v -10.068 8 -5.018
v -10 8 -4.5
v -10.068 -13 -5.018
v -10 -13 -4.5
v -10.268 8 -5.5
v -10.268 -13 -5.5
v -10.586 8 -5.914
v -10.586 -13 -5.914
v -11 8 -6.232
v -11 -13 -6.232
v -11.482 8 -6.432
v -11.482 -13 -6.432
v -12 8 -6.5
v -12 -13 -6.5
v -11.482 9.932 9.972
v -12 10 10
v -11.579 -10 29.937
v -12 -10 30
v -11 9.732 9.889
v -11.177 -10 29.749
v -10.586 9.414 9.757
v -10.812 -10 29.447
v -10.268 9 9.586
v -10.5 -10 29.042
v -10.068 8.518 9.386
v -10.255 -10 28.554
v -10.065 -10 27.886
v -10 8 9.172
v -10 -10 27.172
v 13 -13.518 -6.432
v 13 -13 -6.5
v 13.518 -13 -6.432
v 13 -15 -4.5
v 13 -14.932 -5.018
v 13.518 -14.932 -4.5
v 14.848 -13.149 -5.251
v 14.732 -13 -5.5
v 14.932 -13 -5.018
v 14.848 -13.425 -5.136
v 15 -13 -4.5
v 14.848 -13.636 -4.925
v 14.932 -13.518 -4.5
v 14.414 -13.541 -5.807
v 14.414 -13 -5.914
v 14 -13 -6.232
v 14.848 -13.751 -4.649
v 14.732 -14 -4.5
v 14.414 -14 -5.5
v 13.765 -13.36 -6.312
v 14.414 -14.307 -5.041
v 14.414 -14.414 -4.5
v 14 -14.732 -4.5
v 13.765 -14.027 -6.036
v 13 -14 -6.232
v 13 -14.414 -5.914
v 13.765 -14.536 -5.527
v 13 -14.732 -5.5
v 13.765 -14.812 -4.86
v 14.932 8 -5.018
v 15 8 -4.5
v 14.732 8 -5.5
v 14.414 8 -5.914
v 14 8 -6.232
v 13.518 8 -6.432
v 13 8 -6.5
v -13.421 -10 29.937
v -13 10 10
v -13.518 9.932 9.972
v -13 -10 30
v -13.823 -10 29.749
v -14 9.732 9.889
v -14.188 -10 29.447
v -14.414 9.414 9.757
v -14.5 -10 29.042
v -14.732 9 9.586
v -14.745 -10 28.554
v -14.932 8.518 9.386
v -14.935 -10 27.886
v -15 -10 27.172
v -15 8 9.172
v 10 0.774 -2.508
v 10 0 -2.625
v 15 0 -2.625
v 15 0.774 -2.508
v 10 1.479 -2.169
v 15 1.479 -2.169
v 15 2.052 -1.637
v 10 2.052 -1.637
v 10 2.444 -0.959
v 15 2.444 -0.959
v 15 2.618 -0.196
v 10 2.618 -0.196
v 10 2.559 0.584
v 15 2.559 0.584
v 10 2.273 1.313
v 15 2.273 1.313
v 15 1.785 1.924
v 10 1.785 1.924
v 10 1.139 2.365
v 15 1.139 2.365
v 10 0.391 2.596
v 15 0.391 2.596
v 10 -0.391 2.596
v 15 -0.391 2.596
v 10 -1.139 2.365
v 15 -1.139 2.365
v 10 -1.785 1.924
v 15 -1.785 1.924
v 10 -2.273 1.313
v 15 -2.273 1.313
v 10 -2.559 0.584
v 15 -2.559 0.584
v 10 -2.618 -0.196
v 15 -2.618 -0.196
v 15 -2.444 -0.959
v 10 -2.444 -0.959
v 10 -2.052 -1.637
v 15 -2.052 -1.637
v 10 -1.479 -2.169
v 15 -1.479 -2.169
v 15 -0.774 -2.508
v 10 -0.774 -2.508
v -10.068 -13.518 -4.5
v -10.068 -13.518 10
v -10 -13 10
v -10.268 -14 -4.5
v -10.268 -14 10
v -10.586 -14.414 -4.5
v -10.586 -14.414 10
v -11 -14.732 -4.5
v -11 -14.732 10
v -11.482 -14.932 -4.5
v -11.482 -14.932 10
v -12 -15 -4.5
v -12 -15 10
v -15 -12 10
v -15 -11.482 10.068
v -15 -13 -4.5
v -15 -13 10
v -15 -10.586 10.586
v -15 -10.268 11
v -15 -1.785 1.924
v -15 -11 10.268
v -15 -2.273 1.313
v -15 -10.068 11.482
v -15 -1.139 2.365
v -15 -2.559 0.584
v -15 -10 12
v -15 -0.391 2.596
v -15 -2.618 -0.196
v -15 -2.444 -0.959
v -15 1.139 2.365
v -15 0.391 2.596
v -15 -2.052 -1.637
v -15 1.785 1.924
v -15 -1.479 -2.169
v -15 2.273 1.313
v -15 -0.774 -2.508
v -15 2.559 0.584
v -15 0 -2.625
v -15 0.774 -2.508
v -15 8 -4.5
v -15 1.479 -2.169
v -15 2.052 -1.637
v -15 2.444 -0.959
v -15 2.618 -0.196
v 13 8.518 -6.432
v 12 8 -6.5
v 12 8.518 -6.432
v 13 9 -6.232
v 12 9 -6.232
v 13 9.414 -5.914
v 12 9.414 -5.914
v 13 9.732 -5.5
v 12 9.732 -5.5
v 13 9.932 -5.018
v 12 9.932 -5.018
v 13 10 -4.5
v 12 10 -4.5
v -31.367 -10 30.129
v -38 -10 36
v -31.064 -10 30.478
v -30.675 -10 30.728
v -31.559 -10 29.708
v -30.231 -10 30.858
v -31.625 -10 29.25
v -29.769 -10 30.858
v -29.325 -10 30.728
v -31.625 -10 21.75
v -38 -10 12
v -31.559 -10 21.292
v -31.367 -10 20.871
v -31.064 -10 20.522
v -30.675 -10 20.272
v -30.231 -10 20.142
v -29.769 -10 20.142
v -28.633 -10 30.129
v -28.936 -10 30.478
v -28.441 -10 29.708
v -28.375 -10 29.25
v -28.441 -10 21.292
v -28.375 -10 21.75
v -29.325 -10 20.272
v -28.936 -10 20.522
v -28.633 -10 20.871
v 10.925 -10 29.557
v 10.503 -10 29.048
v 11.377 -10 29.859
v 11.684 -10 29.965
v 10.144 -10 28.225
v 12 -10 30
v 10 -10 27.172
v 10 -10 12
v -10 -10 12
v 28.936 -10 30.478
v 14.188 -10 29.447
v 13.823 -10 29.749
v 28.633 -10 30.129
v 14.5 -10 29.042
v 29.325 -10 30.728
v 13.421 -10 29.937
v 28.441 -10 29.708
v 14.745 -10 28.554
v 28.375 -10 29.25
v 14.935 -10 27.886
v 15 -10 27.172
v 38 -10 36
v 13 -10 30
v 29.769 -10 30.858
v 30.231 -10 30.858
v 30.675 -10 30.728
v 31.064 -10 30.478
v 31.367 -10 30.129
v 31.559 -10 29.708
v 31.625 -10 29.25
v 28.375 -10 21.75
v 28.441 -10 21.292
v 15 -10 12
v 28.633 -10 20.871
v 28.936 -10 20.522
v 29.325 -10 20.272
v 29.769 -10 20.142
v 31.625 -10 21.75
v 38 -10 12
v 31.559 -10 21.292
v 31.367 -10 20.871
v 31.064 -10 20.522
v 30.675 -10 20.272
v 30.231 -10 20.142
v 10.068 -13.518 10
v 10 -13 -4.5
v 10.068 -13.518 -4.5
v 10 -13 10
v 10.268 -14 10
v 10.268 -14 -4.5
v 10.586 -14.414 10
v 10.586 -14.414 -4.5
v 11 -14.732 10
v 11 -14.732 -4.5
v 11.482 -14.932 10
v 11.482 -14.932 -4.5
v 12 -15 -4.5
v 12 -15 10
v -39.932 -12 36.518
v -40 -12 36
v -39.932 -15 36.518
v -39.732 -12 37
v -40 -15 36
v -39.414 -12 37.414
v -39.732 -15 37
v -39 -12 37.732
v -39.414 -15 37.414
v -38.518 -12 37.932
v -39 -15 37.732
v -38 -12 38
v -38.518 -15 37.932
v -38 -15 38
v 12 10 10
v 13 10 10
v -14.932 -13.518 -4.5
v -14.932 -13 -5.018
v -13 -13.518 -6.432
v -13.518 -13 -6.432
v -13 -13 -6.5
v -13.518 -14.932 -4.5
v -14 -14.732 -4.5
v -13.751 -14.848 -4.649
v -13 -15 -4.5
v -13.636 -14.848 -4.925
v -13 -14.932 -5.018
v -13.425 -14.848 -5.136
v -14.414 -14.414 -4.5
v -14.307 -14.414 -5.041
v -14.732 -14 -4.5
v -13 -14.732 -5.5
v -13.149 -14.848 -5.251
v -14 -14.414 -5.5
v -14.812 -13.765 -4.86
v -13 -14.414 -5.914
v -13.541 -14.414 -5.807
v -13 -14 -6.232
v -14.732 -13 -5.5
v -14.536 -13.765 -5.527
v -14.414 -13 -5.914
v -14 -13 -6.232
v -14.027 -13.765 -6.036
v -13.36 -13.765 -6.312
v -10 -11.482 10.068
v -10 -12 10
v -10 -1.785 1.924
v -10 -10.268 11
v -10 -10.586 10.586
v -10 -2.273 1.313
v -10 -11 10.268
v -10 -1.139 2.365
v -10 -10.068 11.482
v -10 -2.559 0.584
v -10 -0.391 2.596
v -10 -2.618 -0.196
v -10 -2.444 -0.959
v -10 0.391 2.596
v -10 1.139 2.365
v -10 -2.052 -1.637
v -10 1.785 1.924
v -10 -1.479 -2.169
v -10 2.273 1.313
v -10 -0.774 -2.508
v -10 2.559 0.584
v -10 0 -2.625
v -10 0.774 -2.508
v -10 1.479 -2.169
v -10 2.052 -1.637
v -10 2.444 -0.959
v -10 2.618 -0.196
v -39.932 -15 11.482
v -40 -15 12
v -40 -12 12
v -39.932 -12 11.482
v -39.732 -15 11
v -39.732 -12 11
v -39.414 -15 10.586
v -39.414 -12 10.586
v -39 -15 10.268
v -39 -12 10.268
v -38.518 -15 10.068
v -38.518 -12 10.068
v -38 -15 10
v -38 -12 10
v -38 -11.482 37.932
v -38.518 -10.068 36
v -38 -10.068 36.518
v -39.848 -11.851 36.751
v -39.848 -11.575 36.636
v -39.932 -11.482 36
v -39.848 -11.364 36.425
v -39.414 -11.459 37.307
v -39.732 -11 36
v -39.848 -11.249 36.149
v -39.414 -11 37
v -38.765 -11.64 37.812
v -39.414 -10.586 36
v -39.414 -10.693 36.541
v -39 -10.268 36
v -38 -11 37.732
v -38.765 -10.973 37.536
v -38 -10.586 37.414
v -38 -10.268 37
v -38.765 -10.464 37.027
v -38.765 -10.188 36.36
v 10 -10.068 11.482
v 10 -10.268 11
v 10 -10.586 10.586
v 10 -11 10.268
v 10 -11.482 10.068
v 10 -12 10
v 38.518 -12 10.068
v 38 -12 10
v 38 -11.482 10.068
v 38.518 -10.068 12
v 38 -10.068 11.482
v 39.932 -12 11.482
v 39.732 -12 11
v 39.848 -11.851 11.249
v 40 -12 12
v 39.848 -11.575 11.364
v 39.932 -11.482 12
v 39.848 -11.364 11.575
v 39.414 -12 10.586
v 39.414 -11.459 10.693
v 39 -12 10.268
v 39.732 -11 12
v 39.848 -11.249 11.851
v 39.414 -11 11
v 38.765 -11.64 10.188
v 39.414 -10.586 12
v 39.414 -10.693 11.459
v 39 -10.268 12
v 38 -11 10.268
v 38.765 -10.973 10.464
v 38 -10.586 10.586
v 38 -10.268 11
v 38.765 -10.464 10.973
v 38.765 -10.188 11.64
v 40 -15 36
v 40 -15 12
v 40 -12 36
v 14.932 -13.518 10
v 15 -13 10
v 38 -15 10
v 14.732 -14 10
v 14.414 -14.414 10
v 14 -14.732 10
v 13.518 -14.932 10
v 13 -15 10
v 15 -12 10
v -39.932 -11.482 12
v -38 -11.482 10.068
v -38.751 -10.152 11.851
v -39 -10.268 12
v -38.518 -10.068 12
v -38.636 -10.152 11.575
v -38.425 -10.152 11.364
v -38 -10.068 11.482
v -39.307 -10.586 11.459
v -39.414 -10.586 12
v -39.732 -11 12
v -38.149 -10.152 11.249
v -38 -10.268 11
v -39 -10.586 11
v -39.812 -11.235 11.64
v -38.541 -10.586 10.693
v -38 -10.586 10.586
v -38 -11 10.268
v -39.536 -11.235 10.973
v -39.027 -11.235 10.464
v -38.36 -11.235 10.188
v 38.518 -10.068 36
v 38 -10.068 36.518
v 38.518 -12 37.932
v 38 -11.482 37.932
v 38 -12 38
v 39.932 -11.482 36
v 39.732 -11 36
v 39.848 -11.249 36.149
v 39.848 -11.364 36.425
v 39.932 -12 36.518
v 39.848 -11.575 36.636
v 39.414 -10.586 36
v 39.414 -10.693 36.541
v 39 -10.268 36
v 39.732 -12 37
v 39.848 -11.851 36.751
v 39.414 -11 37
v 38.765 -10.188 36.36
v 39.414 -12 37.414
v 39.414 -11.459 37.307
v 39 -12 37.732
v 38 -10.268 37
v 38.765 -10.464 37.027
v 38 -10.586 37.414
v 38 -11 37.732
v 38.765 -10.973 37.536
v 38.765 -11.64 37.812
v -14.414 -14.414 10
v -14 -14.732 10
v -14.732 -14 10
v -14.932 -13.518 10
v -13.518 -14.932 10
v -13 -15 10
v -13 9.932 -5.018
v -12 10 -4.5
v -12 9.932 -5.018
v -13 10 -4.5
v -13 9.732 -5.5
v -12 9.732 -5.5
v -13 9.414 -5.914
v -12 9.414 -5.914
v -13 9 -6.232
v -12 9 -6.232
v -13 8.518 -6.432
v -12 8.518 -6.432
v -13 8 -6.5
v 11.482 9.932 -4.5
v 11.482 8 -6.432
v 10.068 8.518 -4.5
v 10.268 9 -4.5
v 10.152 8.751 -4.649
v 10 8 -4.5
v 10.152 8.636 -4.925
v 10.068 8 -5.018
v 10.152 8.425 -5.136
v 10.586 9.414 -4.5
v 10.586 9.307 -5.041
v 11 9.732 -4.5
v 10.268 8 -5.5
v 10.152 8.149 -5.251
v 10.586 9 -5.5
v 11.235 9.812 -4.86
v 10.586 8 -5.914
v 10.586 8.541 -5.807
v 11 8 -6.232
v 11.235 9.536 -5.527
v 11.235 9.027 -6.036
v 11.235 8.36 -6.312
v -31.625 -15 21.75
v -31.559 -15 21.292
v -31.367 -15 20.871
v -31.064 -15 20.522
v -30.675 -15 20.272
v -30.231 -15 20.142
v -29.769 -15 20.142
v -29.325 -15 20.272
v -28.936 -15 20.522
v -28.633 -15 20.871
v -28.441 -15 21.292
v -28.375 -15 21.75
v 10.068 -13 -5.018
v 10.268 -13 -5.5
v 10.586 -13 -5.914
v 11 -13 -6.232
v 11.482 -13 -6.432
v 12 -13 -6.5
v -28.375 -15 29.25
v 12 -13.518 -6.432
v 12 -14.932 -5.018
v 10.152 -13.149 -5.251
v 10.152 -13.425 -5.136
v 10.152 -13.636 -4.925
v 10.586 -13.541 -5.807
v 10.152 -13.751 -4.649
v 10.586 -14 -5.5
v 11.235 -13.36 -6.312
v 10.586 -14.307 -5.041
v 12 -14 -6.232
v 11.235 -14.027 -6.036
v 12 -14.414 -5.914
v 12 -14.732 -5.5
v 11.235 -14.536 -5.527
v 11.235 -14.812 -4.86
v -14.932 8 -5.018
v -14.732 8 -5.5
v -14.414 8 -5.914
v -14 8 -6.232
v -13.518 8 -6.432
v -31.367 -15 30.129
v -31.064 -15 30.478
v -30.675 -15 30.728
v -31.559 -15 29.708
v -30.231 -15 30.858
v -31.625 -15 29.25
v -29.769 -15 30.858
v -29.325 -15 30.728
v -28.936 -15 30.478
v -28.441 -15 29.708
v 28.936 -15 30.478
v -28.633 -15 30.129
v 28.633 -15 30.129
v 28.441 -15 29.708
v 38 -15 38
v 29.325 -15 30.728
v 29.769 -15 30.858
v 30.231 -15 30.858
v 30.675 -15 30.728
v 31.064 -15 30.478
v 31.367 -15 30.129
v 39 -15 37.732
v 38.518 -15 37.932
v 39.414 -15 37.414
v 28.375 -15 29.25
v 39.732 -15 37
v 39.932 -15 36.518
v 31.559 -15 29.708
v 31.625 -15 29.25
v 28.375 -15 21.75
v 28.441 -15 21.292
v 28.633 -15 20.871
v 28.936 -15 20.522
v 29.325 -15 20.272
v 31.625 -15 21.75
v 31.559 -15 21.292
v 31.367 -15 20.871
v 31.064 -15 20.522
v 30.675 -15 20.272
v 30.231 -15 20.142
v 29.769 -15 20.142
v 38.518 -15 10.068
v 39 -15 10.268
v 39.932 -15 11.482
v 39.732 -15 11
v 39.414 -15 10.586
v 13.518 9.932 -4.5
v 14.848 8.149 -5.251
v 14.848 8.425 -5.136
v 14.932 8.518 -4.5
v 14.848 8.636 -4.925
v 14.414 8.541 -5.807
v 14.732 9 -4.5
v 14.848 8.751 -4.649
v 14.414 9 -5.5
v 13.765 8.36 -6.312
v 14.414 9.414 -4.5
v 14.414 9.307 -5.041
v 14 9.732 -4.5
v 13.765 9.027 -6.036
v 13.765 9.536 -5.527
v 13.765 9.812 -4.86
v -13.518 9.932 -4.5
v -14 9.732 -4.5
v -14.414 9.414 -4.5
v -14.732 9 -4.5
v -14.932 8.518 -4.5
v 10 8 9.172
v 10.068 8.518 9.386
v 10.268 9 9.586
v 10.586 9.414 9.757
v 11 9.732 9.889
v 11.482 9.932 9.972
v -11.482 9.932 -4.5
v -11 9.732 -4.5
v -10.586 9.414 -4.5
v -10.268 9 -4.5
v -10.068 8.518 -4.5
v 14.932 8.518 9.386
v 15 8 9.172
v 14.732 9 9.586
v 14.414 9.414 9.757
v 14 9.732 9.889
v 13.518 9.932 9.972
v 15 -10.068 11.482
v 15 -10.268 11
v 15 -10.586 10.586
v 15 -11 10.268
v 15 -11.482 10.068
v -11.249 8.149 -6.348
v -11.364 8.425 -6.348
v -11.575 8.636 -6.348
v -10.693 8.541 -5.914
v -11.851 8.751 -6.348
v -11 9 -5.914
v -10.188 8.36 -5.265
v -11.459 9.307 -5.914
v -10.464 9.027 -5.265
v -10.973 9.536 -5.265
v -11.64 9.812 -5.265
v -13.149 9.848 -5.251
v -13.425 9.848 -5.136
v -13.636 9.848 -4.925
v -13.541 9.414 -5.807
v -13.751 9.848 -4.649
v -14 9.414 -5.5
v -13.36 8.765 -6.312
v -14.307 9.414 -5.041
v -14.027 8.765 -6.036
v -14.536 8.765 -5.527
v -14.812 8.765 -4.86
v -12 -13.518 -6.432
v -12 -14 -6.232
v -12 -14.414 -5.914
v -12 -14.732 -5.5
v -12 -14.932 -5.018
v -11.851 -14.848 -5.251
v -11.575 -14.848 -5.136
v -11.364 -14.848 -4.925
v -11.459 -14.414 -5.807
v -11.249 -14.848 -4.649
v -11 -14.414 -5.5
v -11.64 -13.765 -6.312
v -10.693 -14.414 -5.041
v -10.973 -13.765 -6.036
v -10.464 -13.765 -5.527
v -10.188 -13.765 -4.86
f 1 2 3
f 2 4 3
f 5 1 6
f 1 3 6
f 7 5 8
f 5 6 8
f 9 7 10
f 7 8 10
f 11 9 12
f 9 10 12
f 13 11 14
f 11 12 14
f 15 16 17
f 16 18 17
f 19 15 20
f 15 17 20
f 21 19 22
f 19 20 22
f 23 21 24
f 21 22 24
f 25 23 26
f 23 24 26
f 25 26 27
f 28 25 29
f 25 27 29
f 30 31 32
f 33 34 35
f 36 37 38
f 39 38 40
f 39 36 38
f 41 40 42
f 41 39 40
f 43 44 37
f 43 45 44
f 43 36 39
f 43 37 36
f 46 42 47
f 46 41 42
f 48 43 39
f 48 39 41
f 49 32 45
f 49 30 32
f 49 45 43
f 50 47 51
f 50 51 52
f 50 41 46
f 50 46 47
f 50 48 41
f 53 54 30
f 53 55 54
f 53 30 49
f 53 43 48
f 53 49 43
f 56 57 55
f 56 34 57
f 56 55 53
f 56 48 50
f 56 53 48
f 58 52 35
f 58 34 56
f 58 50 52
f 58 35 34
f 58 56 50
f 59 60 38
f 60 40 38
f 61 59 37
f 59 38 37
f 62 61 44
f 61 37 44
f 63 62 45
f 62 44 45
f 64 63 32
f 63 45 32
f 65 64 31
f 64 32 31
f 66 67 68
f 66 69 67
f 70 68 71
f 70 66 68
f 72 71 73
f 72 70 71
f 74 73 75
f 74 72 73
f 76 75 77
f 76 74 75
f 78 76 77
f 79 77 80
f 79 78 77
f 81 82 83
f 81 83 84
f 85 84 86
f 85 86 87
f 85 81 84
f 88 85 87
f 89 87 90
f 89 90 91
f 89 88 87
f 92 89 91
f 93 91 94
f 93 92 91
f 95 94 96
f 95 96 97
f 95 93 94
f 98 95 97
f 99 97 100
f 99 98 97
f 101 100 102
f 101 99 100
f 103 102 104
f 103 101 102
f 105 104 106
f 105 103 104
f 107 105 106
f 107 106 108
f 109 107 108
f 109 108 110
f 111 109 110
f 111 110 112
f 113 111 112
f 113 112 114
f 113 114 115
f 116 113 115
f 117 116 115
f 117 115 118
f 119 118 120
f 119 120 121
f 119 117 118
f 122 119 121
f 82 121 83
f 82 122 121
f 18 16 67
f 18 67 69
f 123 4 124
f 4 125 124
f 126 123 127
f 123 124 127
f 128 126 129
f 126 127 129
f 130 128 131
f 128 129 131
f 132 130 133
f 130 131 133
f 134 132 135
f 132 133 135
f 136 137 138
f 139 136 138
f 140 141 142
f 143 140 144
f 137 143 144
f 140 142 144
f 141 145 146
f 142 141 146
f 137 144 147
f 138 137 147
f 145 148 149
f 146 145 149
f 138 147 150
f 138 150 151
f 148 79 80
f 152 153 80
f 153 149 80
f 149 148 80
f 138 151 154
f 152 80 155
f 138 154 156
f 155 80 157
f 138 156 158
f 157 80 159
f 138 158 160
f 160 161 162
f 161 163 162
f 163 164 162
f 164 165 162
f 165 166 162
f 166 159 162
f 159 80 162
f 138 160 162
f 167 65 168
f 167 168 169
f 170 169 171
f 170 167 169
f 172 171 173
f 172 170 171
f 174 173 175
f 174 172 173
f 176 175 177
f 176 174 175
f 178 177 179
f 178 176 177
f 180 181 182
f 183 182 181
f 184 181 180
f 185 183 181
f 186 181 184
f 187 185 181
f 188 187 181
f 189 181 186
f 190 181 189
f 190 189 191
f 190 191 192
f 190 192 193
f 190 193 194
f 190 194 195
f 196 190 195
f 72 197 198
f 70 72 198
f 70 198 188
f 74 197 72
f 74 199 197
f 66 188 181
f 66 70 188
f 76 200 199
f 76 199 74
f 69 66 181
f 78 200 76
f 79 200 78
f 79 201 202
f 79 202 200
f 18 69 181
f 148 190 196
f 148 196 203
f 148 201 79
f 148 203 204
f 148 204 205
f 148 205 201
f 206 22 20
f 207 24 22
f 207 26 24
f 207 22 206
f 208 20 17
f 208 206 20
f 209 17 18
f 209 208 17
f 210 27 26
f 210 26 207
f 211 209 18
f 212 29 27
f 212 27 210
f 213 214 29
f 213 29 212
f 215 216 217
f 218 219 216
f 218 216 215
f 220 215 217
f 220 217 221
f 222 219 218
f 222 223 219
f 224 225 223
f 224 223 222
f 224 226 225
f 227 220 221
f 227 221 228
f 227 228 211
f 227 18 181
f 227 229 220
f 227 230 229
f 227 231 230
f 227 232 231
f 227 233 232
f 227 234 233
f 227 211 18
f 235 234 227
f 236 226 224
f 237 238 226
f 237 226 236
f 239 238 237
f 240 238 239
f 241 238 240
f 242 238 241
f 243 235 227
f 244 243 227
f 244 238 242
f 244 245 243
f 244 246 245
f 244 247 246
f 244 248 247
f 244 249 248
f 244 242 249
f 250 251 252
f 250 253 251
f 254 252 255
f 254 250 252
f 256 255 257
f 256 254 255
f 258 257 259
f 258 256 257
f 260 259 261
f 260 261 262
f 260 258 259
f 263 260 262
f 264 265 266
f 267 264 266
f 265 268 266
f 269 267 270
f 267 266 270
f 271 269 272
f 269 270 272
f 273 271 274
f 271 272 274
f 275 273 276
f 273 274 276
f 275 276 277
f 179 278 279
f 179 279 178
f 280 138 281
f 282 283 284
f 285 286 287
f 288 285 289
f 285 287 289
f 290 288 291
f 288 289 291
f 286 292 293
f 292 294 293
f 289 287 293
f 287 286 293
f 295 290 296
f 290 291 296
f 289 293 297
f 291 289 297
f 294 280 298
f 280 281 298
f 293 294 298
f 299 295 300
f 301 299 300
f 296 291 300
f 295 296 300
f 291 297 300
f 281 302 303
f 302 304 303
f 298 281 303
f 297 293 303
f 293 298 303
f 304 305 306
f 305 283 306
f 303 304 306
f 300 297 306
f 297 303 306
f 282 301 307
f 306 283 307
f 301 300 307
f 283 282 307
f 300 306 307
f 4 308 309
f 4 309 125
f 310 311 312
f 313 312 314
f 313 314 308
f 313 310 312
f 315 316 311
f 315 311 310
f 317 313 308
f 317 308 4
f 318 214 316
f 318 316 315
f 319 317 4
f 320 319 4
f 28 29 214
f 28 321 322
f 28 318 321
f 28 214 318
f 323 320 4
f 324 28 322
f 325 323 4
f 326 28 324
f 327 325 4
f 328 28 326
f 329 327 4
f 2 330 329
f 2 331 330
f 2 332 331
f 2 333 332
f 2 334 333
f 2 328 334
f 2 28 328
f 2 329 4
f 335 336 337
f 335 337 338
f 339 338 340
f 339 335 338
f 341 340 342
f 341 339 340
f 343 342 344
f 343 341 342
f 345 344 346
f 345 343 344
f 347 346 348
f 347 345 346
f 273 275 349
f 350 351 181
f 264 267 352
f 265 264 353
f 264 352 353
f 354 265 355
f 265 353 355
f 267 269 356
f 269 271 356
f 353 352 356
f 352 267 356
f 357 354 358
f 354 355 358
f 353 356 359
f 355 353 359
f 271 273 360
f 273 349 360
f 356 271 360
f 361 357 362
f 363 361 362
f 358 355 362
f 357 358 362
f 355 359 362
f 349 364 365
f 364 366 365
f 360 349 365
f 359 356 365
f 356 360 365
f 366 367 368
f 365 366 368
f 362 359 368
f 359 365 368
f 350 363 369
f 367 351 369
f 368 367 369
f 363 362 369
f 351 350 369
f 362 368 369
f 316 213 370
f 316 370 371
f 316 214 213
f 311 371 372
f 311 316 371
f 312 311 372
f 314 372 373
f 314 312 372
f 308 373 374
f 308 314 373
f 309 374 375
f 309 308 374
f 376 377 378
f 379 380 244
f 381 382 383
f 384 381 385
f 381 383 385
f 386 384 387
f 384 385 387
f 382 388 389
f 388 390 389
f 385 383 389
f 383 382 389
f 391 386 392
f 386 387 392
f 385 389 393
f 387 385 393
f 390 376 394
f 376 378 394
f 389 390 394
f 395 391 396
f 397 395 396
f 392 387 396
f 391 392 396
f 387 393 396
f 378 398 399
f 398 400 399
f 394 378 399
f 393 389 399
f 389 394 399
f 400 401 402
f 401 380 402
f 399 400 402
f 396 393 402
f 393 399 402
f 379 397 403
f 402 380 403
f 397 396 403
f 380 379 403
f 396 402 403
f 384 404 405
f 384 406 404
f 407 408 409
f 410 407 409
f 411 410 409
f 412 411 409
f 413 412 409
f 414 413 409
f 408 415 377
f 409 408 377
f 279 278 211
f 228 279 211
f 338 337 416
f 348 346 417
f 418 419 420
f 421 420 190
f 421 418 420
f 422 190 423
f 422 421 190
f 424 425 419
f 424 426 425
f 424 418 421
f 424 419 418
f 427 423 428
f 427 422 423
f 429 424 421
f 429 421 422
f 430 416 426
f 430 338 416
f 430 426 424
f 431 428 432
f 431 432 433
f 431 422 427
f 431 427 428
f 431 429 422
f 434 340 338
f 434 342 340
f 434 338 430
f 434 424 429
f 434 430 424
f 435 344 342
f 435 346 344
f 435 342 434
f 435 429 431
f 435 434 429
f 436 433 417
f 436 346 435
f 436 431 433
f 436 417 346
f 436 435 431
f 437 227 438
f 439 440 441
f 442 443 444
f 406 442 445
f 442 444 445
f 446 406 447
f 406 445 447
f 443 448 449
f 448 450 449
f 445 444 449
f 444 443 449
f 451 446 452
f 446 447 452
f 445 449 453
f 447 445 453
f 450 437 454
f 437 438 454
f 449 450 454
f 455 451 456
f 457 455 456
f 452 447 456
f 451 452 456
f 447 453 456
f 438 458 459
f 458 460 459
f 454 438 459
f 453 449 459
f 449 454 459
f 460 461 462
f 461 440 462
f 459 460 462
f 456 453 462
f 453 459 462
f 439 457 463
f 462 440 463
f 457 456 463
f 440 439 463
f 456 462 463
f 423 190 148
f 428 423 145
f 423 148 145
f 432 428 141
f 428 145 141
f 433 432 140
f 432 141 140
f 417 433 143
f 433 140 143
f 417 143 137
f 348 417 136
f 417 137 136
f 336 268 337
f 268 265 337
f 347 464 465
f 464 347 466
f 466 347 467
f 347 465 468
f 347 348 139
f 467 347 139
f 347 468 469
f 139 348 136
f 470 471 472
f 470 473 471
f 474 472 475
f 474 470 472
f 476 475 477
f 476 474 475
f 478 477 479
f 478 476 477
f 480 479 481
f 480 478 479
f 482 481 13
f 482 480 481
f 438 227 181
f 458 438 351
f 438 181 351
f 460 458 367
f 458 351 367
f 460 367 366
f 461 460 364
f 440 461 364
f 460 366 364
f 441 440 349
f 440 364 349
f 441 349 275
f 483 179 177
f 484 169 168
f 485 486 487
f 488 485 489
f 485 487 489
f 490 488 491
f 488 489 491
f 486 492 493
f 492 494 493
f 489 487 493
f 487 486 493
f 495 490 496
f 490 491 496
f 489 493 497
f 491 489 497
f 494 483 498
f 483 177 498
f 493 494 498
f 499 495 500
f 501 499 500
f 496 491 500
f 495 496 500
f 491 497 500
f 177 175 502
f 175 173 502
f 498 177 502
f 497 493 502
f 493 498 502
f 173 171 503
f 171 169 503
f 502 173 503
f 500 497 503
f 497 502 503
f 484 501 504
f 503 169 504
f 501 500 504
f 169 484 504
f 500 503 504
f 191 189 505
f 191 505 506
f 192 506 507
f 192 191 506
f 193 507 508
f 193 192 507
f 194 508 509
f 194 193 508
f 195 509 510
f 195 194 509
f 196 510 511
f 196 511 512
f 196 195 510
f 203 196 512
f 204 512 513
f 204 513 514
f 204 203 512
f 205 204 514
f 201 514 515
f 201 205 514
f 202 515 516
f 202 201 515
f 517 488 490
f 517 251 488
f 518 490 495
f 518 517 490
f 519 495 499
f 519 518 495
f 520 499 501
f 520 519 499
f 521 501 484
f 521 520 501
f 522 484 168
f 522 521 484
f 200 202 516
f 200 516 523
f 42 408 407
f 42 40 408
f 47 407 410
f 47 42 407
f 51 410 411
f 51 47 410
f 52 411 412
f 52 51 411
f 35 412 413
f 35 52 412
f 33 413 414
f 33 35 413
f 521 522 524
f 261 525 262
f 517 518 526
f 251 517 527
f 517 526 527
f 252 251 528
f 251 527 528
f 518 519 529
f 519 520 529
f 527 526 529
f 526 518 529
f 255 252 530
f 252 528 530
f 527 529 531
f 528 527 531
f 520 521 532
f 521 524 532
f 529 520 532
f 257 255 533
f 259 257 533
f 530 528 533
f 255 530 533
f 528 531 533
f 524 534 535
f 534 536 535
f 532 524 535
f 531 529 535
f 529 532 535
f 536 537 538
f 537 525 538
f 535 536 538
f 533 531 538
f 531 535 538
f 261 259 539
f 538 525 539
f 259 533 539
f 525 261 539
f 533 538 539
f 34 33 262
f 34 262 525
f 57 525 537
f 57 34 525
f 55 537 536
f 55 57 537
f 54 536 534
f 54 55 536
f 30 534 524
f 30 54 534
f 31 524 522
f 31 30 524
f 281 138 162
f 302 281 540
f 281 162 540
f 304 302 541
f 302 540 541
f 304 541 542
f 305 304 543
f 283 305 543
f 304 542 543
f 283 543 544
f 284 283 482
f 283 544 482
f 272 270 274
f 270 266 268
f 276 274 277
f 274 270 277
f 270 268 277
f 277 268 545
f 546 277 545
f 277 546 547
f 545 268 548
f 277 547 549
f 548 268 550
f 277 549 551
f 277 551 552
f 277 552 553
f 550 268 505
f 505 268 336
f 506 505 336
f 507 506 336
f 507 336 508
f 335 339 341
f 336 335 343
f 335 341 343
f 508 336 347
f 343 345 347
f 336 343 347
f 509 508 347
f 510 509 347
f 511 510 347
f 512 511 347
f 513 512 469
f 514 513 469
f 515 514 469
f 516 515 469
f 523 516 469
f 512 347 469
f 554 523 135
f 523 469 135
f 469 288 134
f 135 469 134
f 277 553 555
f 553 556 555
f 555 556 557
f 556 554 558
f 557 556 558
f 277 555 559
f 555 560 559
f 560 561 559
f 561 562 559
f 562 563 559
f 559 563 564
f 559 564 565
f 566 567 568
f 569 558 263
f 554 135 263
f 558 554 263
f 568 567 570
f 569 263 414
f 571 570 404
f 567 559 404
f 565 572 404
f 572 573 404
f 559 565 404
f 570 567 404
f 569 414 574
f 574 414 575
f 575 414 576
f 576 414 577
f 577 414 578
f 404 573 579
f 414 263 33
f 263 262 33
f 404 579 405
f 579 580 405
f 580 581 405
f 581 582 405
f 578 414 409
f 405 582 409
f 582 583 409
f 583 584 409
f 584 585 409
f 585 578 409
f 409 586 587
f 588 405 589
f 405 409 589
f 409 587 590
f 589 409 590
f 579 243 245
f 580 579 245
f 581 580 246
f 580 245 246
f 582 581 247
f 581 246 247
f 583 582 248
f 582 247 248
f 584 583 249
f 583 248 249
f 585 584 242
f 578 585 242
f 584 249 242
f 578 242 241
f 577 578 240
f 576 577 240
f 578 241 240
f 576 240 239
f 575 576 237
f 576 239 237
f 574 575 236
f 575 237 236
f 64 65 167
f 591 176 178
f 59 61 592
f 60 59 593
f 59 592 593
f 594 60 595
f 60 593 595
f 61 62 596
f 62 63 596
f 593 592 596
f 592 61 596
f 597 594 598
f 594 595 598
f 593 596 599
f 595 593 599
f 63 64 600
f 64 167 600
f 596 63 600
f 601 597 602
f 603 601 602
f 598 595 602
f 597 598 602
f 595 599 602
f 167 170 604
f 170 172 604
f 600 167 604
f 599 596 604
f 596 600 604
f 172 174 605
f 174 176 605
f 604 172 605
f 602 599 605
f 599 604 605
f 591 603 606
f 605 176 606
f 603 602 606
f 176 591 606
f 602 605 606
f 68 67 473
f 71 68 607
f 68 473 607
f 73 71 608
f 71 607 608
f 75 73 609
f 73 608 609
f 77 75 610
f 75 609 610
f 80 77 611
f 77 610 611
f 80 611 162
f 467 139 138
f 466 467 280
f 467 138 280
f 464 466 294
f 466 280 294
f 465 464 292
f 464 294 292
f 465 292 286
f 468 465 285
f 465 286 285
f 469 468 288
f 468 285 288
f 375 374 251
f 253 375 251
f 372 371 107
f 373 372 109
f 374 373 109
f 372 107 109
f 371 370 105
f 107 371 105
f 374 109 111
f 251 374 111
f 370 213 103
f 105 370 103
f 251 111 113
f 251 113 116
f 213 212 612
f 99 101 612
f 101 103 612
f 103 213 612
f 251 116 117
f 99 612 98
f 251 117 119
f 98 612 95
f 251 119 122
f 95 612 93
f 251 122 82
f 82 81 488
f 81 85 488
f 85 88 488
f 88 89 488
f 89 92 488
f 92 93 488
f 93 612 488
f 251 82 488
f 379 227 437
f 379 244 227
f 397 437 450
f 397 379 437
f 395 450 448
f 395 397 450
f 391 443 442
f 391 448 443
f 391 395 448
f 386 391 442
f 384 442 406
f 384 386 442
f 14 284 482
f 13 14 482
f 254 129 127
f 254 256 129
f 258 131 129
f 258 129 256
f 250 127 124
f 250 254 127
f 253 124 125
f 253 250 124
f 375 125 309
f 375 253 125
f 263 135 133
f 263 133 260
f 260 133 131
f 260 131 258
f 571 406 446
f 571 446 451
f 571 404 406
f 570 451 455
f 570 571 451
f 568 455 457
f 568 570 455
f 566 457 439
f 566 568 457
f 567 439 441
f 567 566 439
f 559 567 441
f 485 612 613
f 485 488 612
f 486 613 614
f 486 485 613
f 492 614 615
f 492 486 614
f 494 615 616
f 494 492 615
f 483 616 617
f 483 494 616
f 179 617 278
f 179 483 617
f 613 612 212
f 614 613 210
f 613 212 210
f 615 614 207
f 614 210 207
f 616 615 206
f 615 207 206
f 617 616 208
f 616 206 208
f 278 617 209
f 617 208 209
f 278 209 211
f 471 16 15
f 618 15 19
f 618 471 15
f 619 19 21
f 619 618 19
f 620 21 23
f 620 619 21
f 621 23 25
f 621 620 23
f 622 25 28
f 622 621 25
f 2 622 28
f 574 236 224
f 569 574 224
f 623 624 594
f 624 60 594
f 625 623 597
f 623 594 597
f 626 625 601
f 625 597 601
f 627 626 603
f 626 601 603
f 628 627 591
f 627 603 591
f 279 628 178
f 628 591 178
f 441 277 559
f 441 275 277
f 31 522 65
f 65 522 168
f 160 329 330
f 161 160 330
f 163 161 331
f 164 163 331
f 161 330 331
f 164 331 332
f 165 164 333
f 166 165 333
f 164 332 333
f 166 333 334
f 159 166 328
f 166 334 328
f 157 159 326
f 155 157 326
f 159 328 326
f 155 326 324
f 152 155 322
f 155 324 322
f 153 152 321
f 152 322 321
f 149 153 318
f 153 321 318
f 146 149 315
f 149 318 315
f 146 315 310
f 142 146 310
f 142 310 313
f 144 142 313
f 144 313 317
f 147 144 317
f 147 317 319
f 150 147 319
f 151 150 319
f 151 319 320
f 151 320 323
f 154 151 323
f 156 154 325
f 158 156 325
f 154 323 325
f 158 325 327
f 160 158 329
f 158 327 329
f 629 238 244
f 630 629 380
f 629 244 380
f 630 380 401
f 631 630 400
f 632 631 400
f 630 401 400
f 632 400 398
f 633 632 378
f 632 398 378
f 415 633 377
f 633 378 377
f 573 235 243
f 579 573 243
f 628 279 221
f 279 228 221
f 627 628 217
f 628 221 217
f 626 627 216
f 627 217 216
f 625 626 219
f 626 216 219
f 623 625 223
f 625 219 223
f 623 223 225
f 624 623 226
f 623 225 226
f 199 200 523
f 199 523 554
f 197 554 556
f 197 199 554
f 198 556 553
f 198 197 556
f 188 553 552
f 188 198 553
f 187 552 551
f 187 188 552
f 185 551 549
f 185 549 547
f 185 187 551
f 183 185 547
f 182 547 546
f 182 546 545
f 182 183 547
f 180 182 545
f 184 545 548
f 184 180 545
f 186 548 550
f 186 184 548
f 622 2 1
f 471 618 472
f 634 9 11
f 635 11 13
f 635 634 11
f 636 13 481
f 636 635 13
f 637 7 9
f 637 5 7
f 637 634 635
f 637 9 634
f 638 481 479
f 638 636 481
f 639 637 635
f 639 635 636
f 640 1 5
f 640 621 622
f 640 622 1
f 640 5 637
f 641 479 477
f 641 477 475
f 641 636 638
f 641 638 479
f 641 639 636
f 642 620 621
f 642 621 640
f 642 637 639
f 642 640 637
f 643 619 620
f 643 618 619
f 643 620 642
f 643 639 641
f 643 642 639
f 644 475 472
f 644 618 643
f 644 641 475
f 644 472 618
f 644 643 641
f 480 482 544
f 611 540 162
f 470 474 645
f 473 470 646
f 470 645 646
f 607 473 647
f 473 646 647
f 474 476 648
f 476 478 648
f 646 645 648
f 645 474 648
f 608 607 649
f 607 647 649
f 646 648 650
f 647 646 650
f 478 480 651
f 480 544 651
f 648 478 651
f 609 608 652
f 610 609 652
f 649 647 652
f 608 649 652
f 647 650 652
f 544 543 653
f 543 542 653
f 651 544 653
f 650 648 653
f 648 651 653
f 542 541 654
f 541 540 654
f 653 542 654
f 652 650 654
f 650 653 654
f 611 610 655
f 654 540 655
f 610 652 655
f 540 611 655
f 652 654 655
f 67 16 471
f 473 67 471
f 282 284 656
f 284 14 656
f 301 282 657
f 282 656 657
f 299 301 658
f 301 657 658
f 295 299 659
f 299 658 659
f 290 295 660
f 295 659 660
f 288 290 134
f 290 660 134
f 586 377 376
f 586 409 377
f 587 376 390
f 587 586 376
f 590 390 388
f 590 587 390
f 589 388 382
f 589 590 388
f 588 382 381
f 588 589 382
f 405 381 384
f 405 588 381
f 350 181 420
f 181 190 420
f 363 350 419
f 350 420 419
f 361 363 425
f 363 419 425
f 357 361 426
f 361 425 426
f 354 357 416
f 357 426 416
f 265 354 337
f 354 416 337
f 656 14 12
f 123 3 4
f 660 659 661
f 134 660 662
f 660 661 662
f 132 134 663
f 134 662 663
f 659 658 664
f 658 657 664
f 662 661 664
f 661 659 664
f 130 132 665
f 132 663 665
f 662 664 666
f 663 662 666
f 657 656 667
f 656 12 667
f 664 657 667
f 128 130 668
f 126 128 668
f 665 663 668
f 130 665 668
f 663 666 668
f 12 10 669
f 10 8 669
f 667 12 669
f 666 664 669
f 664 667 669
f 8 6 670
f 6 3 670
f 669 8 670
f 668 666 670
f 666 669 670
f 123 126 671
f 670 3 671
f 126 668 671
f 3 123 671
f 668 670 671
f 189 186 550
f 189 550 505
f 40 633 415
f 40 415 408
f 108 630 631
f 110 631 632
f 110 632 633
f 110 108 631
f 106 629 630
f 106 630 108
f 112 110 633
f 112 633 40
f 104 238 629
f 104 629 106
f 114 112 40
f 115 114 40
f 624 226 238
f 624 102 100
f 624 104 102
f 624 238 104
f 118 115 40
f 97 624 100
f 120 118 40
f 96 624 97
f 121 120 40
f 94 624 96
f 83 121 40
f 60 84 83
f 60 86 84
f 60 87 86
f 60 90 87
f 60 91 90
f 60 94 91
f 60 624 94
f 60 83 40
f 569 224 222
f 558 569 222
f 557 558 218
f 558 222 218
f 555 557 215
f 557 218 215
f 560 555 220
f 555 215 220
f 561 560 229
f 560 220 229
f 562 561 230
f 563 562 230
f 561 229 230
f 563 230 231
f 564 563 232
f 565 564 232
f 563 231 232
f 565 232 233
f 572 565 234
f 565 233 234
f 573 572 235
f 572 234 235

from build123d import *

# Parameters (mm, degrees)
BOSS_EXTRUDE1_START            = 10
SKETCH1_W                      = 16.5
SKETCH1_H                      = 20
SKETCH1_R                      = 2.625
BOSS_EXTRUDE1_DEPTH            = 5
BOSS_EXTRUDE2_START            = -10
SKETCH1_3_W                    = 16.5
SKETCH1_3_H                    = 20
SKETCH1_3_R                    = 2.625
BOSS_EXTRUDE2_DEPTH            = 5
BOSS_EXTRUDE3_START            = -15
SKETCH1_4_W                    = 16.5
SKETCH1_4_H                    = 5
SKETCH1_4_W_2                  = 28
BOSS_EXTRUDE3_DEPTH            = 30
SKETCH2_W                      = 25
SKETCH2_H                      = 28
BOSS_EXTRUDE4_DEPTH            = 5
CUT_EXTRUDE1_REACH             = 59.175
SKETCH1_6_W                    = 16.5
SKETCH1_6_H                    = 5
CUT_EXTRUDE1_DIRECTION_2_REACH = 59.175
BOSS_EXTRUDE5_START            = 10
BOSS_EXTRUDE5_DEPTH            = 5
BOSS_EXTRUDE6_START            = -10
BOSS_EXTRUDE6_DEPTH            = 5
FILLET1_R                      = 2


with BuildPart() as part:
    # Sketch1 → Boss-Extrude1 (new body)
    with BuildSketch(Plane(origin=(0, 0, 0), x_dir=(0, 0, -1), z_dir=(1, 0, 0)).offset(BOSS_EXTRUDE1_START)):
        with Locations((-1.75, 0)):
            Rectangle(SKETCH1_W, SKETCH1_H)
        Circle(SKETCH1_R, mode=Mode.SUBTRACT)
    extrude(amount=BOSS_EXTRUDE1_DEPTH)



with BuildPart() as body_2:
    # Sketch1<3> → Boss-Extrude2 (new body)
    with BuildSketch(Plane(origin=(0, 0, 0), x_dir=(0, 0, -1), z_dir=(1, 0, 0)).offset(BOSS_EXTRUDE2_START)):
        with Locations((-1.75, 0)):
            Rectangle(SKETCH1_3_W, SKETCH1_3_H)
        Circle(SKETCH1_3_R, mode=Mode.SUBTRACT)
    extrude(amount=-BOSS_EXTRUDE2_DEPTH)


with BuildPart() as part_1:
    add(part.part)

    add(body_2.part)  # Boss-Extrude3 merges body 2
    # Sketch1<4> → Boss-Extrude3 (add)
    with BuildSketch(Plane(origin=(0, 0, 0), x_dir=(0, 0, -1), z_dir=(1, 0, 0)).offset(BOSS_EXTRUDE3_START)):
        with Locations((-1.75, -12.5)):
            Rectangle(SKETCH1_4_W, SKETCH1_4_H)
        with Locations((-24, -12.5)):
            Rectangle(SKETCH1_4_W_2, SKETCH1_4_H)
    extrude(amount=BOSS_EXTRUDE3_DEPTH)

    # Sketch2 → Boss-Extrude4 (add)
    with BuildSketch(Plane(origin=(0, -10, 0), x_dir=(1, 0, 0), z_dir=(0, 1, 0))):
        with Locations((-27.5, -24)):
            Rectangle(SKETCH2_W, SKETCH2_H)
        with BuildLine():
            Line((-31.625, -29.25), (-31.625, -21.75))
            ThreePointArc((-31.625, -21.75), (-30, -20.125), (-28.375, -21.75))
            Line((-28.375, -21.75), (-28.375, -29.25))
            ThreePointArc((-28.375, -29.25), (-30, -30.875), (-31.625, -29.25))
        make_face(mode=Mode.SUBTRACT)
        with Locations((27.5, -24)):
            Rectangle(SKETCH2_W, SKETCH2_H)
        with BuildLine():
            Line((31.625, -29.25), (31.625, -21.75))
            ThreePointArc((31.625, -21.75), (30, -20.125), (28.375, -21.75))
            Line((28.375, -21.75), (28.375, -29.25))
            ThreePointArc((28.375, -29.25), (30, -30.875), (31.625, -29.25))
        make_face(mode=Mode.SUBTRACT)
    extrude(amount=-BOSS_EXTRUDE4_DEPTH)

    # Cut-Extrude1: up to this face of the body (flat: up to its plane)
    cut_extrude1_end = Plane(part_1.part.faces().sort_by_distance((10, 0, -6.240722157))[0])
    # Sketch1<6> → Cut-Extrude1 (cut, up to the picked face)
    with BuildSketch(Plane(origin=(0, 0, 0), x_dir=(0, 0, -1), z_dir=(1, 0, 0)), mode=Mode.PRIVATE) as cut_extrude1_sk1:
        with Locations((-1.75, -12.5)):
            Rectangle(SKETCH1_6_W, SKETCH1_6_H)
    cut_extrude1_tool1 = split(extrude(cut_extrude1_sk1.sketch, amount=CUT_EXTRUDE1_REACH, mode=Mode.PRIVATE), bisect_by=cut_extrude1_end, keep=Keep.BOTH, mode=Mode.PRIVATE)
    add(cut_extrude1_tool1.solids().sort_by(Axis((0, -12.5, 1.75), (1, 0, 0)))[0], mode=Mode.SUBTRACT)

    # Cut-Extrude1 direction 2: up to this face of the body (flat: up to its plane)
    cut_extrude1_direction_2_end = Plane(part_1.part.faces().sort_by_distance((-10, 0, -6.240722157))[0])
    # Sketch1<6> → Cut-Extrude1 direction 2 (cut, up to the picked face)
    with BuildSketch(Plane(origin=(0, 0, 0), x_dir=(0, 0, -1), z_dir=(1, 0, 0)), mode=Mode.PRIVATE) as cut_extrude1_direction_2_sk1:
        with Locations((-1.75, -12.5)):
            Rectangle(SKETCH1_6_W, SKETCH1_6_H)
    cut_extrude1_direction_2_tool1 = split(extrude(cut_extrude1_direction_2_sk1.sketch, amount=-CUT_EXTRUDE1_DIRECTION_2_REACH, mode=Mode.PRIVATE), bisect_by=cut_extrude1_direction_2_end, keep=Keep.BOTH, mode=Mode.PRIVATE)
    add(cut_extrude1_direction_2_tool1.solids().sort_by(Axis((0, -12.5, 1.75), (-1, 0, 0)))[0], mode=Mode.SUBTRACT)

    # Sketch1<7> → Boss-Extrude5 (add)
    with BuildSketch(Plane(origin=(0, 0, 0), x_dir=(0, 0, -1), z_dir=(1, 0, 0)).offset(BOSS_EXTRUDE5_START)):
        Polygon((-30, -10), (-10, -10), (-10, 10), align=None)
    extrude(amount=BOSS_EXTRUDE5_DEPTH)

    # Sketch1<8> → Boss-Extrude6 (add)
    with BuildSketch(Plane(origin=(0, 0, 0), x_dir=(0, 0, -1), z_dir=(1, 0, 0)).offset(BOSS_EXTRUDE6_START)):
        Polygon((-30, -10), (-10, -10), (-10, 10), align=None)
    extrude(amount=-BOSS_EXTRUDE6_DEPTH)

    # Fillet1
    fillet1_edges = [part_1.edges().sort_by_distance(p)[0] for p in [
        (12.5, 10, -6.5),
        (-10, 0, 20),
        (-15, 0, 20),
        (12.5, -15, -6.5),
        (-15, -2.5, -6.5),
        (0, -10, 38),
        (-15, -15, 1.75),
        (15, -2.5, -6.5),
        (15, 10, 1.75),
        (-10, 10, 1.75),
        (-10, -2.5, -6.5),
        (-12.5, 10, -6.5),
        (-15, 10, 1.75),
        (15, -15, 1.75),
        (-40, -12.5, 38),
        (-40, -12.5, 10),
        (-40, -10, 24),
        (-27.5, -10, 10),
        (27.5, -10, 10),
        (40, -12.5, 10),
        (40, -10, 24),
        (40, -12.5, 38),
        (10, 10, 1.75),
        (10, -2.5, -6.5),
        (-12.5, -15, -6.5),
        (10, -15, 1.75),
        (0, -10, 10),
        (-10, -15, 1.75),
        (10, 0, 20),
        (15, 0, 20),
    ]]
    fillet(fillet1_edges, radius=FILLET1_R)


solid = part_1.part
